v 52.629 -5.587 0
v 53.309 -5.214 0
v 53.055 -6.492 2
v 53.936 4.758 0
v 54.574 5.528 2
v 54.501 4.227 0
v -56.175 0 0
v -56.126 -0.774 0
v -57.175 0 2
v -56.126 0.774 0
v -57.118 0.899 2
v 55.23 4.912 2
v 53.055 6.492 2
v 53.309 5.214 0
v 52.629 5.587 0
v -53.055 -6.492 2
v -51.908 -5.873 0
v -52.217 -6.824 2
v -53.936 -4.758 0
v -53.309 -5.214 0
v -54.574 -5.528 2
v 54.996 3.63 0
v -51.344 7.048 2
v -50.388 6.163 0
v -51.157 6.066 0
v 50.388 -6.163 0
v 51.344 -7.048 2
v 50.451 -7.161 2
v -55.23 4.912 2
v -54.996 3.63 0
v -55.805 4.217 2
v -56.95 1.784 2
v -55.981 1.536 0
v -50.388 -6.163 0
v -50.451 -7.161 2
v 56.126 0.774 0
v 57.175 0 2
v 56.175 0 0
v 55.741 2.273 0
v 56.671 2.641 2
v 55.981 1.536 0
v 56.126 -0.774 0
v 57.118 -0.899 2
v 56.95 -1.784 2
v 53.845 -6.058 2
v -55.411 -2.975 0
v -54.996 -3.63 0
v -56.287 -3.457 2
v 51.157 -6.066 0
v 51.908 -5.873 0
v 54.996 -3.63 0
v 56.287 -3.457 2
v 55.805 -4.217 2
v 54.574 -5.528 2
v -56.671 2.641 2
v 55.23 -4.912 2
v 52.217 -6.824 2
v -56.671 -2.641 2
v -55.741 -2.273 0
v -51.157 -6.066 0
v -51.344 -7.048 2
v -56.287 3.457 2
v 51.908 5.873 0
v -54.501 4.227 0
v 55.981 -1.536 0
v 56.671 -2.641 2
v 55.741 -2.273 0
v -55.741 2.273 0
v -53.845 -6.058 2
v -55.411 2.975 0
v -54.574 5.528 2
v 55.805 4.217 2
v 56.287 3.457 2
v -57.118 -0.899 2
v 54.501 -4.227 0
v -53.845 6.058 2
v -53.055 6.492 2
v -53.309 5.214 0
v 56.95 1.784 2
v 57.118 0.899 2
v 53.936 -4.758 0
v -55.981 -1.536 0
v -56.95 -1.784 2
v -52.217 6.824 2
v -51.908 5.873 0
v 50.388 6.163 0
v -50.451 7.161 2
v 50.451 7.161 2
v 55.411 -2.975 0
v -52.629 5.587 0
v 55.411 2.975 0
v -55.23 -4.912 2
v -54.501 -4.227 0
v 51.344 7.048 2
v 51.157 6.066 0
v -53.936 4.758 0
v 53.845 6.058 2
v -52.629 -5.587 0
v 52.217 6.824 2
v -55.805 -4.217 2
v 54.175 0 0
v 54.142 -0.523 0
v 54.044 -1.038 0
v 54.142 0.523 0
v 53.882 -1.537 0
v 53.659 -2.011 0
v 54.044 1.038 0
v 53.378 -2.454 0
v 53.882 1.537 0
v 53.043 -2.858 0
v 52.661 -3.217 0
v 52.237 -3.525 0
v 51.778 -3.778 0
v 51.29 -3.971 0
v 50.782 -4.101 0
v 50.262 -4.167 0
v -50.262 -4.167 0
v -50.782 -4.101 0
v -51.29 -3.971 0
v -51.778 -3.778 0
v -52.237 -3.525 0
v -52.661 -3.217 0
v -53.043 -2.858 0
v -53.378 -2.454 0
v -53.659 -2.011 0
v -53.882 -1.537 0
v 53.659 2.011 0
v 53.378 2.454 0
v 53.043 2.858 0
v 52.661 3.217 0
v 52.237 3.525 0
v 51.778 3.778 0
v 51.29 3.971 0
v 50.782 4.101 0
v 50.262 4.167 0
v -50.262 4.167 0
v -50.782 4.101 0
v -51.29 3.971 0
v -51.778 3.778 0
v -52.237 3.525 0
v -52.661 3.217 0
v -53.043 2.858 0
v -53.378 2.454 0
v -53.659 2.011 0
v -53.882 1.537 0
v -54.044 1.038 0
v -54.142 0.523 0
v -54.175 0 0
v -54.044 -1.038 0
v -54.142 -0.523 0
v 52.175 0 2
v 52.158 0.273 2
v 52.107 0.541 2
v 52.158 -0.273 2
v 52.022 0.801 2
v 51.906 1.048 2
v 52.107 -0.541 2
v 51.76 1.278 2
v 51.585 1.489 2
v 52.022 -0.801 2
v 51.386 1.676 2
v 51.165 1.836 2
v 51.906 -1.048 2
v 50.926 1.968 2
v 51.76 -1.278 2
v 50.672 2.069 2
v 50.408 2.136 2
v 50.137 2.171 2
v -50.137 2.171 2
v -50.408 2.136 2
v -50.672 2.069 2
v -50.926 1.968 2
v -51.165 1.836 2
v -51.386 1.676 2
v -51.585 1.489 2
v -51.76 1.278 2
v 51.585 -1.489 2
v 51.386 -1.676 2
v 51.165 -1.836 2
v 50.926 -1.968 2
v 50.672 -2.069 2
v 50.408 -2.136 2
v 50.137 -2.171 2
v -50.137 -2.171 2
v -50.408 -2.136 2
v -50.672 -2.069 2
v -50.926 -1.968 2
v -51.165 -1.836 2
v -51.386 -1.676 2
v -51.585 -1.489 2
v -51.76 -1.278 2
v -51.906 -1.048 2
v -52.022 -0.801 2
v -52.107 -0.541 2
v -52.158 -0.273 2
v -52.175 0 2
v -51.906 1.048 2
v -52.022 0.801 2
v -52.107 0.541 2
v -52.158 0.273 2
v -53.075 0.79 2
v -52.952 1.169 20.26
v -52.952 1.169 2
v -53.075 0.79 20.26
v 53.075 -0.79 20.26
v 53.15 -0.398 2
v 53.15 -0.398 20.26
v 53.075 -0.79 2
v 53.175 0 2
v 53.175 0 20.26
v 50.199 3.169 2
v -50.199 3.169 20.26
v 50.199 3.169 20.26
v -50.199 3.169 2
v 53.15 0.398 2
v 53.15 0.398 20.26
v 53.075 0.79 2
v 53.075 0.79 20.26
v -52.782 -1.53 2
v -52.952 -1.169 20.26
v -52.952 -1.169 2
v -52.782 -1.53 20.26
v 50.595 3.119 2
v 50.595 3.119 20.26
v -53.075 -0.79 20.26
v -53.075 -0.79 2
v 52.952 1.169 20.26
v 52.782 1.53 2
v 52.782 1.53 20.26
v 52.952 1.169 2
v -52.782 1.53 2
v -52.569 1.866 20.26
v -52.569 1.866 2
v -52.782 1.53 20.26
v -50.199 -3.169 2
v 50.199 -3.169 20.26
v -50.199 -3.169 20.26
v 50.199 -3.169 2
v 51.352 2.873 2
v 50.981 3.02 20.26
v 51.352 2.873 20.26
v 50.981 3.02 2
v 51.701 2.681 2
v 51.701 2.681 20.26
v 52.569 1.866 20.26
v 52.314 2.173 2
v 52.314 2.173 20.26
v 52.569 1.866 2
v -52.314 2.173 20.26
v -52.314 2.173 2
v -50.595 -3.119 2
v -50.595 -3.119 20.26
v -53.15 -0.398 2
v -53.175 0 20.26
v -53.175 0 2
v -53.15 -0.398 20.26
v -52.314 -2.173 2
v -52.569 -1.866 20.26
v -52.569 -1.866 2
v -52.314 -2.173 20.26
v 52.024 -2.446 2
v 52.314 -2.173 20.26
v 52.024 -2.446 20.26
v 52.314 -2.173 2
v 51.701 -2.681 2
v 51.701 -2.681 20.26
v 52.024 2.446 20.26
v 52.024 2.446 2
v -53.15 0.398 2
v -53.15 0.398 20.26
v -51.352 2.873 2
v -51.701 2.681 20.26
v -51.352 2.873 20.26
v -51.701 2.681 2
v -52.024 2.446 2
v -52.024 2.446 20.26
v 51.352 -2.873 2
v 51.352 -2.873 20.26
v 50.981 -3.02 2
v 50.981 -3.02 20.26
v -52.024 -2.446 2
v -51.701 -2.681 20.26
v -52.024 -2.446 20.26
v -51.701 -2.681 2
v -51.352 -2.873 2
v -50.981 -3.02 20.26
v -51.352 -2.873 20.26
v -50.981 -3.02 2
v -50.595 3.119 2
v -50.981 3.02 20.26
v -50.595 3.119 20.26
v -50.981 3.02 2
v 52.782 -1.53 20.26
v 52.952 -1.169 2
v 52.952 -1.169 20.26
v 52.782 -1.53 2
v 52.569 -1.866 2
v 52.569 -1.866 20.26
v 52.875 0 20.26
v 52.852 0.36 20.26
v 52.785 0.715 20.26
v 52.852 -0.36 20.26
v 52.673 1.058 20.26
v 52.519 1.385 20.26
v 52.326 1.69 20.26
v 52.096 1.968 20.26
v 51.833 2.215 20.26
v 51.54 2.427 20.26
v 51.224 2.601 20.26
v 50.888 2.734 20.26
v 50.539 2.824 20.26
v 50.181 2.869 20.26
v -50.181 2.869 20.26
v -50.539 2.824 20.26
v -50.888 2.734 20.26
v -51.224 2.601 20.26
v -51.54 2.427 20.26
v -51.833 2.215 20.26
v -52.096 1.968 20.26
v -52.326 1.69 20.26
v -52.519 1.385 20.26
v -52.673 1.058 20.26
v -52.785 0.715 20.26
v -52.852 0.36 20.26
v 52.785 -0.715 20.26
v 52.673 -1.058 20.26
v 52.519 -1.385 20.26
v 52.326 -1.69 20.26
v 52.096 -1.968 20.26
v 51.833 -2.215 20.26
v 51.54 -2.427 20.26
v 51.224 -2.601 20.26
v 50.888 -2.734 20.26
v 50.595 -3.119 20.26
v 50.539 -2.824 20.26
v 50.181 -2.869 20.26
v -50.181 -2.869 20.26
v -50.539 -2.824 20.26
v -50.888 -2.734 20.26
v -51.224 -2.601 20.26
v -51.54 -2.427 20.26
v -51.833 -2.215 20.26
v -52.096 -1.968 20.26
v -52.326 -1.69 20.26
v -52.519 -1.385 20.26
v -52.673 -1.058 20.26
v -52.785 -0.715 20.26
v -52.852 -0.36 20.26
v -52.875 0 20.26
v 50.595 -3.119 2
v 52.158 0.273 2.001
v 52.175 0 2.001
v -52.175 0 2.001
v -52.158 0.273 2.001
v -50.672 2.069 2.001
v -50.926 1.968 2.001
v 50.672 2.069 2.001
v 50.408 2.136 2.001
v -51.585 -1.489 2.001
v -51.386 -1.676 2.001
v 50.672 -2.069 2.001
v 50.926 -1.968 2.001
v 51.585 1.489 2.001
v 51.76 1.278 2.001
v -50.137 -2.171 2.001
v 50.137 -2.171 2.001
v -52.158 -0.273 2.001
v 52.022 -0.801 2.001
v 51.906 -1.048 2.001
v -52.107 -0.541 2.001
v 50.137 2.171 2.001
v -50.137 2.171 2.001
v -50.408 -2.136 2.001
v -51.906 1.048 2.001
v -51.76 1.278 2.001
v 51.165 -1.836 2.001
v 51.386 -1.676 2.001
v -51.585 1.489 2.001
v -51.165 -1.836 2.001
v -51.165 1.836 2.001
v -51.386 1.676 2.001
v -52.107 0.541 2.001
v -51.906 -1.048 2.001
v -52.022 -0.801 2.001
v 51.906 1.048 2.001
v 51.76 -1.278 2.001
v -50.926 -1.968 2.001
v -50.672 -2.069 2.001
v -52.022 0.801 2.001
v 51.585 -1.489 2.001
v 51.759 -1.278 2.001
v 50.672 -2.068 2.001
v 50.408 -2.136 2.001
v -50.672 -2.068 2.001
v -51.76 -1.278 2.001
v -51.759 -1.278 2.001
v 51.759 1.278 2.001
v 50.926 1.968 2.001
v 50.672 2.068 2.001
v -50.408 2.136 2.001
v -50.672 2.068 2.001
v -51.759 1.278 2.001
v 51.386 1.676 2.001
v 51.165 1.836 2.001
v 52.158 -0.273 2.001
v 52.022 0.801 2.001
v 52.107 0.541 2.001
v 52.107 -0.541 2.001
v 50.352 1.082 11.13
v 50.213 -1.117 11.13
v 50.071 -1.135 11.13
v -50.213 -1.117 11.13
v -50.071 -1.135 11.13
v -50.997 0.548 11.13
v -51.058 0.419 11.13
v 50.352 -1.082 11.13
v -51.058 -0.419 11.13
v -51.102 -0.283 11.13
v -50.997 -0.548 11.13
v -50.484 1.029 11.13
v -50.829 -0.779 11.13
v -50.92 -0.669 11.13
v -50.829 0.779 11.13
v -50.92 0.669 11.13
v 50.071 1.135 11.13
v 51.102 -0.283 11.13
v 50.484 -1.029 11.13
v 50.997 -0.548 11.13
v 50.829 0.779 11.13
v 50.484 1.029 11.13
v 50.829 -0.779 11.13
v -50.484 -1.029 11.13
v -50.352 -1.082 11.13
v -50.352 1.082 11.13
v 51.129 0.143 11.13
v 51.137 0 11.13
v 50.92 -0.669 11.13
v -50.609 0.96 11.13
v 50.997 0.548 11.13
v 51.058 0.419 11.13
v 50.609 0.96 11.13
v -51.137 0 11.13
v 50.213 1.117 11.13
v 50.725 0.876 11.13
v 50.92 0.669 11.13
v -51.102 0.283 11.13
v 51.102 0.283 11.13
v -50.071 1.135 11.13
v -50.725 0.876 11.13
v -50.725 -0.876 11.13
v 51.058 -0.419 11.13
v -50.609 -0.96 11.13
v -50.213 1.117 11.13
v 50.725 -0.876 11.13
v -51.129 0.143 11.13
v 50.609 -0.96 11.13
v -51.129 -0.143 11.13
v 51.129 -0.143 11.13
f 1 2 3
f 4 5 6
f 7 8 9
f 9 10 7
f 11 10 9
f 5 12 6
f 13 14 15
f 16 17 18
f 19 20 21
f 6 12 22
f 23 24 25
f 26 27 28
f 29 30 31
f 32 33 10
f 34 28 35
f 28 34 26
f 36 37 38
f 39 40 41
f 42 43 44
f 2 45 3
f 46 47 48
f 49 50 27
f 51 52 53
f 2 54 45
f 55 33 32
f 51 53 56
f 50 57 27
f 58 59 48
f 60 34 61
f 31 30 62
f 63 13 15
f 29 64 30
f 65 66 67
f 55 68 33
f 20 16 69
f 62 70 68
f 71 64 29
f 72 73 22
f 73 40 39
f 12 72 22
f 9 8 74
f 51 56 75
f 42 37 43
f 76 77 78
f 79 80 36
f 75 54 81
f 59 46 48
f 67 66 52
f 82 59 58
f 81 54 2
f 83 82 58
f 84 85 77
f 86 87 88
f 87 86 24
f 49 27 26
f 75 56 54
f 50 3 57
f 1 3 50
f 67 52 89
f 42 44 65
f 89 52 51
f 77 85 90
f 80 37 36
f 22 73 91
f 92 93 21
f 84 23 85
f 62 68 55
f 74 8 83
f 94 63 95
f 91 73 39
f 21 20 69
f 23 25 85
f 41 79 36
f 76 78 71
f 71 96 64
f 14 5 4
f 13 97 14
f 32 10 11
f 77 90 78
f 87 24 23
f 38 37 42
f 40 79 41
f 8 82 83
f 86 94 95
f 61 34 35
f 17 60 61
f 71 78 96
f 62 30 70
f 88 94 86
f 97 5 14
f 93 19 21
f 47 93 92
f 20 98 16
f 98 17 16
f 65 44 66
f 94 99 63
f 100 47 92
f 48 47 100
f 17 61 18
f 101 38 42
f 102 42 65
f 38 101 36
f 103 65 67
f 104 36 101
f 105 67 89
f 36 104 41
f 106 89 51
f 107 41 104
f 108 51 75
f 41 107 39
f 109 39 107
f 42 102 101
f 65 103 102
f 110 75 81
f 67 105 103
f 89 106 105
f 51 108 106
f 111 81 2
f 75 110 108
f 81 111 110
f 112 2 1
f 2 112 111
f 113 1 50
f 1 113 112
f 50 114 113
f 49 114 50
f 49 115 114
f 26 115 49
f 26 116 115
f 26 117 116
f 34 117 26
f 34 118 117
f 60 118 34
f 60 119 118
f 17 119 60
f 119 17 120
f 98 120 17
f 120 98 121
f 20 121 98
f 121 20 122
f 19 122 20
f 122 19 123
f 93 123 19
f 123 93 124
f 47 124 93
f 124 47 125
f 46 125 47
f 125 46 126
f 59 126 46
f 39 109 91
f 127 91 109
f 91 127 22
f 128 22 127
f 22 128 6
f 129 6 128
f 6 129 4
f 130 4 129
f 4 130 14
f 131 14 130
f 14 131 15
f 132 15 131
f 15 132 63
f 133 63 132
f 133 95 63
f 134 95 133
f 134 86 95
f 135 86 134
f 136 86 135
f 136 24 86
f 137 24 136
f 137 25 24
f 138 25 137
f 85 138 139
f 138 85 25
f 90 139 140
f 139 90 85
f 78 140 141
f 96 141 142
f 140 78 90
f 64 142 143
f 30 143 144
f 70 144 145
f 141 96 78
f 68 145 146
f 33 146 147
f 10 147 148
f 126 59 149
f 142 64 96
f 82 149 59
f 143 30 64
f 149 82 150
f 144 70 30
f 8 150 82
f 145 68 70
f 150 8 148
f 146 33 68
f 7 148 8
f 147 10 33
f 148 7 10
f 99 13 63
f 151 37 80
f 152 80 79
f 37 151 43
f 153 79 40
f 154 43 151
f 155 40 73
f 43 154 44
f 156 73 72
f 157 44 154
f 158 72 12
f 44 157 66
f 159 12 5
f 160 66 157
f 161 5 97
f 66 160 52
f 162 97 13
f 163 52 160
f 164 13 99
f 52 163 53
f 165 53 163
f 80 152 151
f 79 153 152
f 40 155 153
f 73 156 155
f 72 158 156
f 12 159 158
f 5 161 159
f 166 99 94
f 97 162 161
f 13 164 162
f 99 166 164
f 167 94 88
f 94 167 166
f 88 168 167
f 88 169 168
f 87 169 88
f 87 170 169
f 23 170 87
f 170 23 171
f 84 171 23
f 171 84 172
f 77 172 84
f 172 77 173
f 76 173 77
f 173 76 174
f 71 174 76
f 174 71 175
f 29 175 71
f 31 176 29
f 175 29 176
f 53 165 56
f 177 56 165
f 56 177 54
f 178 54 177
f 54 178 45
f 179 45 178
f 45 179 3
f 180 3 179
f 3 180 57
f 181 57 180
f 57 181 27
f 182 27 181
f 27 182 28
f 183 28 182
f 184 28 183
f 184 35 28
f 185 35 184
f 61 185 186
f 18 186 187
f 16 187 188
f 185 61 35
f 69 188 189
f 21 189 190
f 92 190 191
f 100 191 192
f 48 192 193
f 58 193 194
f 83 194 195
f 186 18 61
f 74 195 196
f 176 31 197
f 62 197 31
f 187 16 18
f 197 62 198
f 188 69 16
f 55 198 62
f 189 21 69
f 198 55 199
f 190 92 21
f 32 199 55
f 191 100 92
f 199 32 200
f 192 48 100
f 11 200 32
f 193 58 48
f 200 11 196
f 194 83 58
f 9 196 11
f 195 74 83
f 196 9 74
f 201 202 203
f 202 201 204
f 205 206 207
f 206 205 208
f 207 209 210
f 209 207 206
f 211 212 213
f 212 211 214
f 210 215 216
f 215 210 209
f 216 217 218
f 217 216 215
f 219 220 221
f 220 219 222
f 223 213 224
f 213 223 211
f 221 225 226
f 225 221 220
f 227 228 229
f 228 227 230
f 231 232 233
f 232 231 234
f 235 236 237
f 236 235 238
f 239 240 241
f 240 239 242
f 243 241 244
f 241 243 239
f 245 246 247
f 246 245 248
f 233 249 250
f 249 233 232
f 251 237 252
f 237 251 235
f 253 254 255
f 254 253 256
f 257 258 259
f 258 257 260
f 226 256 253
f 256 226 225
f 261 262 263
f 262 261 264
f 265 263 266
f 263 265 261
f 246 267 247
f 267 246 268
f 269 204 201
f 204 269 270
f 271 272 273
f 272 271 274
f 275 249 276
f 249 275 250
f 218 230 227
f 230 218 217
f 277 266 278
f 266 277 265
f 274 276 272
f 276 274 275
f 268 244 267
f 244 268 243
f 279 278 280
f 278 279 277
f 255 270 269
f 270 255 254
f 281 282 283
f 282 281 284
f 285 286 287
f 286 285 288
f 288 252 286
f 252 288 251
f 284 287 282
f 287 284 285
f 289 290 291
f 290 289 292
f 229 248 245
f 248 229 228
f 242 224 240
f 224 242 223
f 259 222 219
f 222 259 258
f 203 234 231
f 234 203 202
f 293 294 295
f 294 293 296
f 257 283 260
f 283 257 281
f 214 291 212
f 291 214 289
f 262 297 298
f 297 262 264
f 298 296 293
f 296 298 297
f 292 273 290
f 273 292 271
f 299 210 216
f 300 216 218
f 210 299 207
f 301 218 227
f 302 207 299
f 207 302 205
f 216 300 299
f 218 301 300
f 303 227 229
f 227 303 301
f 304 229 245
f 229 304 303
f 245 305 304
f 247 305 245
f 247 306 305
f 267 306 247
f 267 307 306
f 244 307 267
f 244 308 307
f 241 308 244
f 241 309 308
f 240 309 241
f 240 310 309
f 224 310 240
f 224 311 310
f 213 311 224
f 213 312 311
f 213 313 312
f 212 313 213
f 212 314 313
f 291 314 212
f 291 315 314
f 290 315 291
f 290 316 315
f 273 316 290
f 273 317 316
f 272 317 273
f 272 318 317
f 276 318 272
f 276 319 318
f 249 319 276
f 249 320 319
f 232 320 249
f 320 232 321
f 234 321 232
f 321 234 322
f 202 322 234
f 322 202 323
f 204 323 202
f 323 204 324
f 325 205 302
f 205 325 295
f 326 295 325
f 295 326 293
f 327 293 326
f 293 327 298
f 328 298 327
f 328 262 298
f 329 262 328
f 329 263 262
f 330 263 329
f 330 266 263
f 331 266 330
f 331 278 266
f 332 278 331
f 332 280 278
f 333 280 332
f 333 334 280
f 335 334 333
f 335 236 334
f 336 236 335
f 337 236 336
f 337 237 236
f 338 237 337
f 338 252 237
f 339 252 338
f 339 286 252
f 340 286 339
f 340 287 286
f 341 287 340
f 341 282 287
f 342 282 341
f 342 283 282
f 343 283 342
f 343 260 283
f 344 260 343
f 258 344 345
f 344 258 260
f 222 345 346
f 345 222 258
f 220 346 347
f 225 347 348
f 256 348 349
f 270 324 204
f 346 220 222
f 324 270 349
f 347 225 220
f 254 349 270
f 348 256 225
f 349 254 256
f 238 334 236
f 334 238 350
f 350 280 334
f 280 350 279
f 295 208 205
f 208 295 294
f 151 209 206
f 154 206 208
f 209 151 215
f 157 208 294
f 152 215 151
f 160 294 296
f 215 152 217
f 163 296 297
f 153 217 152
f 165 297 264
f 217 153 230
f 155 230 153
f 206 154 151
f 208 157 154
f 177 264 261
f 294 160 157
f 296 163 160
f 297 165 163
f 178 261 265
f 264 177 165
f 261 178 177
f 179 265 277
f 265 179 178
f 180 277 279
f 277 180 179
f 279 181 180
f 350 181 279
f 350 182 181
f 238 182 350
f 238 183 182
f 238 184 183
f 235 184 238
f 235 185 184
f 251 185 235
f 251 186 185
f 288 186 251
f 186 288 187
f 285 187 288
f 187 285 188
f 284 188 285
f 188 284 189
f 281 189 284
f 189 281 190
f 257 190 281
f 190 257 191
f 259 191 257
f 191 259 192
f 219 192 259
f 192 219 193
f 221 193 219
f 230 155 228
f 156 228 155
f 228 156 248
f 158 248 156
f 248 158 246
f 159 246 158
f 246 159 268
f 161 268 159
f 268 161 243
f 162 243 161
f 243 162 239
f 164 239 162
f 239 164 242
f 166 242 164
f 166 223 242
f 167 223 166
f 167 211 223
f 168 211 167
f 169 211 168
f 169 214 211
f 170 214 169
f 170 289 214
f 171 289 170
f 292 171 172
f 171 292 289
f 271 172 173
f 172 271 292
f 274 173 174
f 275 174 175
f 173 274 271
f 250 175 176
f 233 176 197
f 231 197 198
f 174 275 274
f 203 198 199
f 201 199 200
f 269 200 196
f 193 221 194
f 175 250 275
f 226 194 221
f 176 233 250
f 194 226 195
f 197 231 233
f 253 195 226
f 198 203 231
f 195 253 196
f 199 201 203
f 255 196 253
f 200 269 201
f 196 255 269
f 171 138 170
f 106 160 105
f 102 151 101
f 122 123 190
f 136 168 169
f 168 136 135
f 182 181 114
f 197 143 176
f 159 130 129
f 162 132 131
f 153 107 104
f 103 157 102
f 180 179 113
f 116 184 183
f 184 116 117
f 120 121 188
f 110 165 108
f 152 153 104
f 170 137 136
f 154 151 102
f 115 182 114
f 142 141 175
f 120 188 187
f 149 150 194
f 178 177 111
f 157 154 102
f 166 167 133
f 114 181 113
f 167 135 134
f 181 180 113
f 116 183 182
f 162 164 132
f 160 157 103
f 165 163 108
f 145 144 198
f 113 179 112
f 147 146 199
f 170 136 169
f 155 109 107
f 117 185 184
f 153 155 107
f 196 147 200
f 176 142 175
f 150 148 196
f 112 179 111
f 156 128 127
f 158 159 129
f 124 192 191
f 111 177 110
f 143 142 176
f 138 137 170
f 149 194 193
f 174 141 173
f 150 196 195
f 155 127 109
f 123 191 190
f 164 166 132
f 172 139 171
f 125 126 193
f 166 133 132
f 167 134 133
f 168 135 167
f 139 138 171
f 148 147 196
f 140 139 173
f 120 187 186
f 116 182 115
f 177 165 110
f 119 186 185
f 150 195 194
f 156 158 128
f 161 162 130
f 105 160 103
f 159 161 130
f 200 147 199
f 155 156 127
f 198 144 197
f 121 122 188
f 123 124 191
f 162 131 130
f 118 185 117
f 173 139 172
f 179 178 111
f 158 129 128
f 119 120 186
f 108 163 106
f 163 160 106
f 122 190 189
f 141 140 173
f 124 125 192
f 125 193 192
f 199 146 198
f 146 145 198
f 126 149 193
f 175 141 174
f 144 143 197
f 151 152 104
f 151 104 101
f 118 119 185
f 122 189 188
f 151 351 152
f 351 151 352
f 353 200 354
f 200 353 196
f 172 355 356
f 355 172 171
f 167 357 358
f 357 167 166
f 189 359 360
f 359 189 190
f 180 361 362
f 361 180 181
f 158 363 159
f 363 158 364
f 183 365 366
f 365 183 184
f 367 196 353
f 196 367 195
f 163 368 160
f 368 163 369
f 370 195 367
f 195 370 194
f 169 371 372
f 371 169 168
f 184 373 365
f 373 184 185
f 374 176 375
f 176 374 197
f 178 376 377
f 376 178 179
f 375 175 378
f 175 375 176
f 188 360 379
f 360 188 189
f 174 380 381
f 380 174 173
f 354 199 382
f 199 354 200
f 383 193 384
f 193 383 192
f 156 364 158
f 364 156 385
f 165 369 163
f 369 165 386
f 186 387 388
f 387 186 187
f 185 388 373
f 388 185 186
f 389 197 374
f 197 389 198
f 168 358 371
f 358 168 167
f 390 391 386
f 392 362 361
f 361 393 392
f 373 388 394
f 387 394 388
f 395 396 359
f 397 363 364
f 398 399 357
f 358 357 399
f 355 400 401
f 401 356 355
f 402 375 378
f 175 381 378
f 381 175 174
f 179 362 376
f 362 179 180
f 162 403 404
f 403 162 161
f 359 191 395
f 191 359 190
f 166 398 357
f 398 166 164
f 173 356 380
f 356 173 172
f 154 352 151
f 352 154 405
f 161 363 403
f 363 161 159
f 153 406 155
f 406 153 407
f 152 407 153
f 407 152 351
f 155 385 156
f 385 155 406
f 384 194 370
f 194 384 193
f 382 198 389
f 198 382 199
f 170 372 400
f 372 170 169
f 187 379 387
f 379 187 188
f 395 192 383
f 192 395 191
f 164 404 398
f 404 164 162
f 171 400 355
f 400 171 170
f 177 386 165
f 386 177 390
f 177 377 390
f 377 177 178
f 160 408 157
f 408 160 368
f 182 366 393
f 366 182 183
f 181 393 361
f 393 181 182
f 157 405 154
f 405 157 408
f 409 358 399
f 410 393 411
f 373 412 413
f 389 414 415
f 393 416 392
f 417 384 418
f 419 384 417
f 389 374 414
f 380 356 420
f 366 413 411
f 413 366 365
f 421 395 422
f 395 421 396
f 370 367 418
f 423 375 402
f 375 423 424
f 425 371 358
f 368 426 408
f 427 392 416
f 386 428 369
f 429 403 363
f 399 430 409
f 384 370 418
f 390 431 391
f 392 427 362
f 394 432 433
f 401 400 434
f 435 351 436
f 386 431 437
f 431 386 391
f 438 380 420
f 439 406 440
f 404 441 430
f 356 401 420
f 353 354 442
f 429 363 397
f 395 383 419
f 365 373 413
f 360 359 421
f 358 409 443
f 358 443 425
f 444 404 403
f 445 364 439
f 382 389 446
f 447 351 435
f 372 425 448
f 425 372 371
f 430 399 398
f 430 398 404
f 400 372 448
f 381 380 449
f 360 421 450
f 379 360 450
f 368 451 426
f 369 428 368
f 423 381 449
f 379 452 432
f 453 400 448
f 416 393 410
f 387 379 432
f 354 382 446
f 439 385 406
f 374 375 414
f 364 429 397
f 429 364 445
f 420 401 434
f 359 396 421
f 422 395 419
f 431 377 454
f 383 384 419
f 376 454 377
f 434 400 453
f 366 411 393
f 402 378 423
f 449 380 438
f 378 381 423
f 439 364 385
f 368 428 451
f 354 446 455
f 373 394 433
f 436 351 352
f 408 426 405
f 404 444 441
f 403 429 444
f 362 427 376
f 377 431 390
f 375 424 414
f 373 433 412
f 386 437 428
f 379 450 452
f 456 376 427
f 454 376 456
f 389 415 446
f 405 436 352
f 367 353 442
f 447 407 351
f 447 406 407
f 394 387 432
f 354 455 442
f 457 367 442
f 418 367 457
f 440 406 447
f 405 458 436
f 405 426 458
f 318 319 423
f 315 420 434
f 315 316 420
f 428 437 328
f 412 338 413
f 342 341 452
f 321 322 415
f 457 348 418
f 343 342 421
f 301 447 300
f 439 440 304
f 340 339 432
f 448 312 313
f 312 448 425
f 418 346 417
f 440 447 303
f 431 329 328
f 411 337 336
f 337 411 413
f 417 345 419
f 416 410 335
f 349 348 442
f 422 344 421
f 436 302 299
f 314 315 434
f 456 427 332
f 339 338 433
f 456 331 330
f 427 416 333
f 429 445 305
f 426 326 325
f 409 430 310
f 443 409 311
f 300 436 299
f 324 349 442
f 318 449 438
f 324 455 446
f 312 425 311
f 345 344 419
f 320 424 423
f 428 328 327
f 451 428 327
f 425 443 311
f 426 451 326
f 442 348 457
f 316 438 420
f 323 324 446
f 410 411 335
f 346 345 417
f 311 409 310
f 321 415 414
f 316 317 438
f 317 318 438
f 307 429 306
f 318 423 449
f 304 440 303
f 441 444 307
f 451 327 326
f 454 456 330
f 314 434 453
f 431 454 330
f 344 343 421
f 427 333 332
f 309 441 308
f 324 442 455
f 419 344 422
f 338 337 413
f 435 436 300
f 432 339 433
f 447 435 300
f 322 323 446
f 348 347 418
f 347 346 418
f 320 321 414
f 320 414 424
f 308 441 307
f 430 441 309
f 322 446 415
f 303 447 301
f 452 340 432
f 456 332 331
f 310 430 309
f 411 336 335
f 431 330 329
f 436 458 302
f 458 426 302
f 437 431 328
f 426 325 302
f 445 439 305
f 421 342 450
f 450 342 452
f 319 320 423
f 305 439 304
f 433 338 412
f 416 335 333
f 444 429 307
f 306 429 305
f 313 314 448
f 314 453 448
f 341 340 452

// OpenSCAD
/*
 * 3D Printer Enclosure Filament Grommet
 * By smkent (GitHub) / bulbasaur0 (Printables)
 *
 * Licensed under Creative Commons (4.0 International License) Attribution
 */

/* [Rendering Options] */
// Render in print orientation (upside down)
Print_Orientation = true;

/* [Size] */
// All units in millimeters

// Thickness of surface the grommet will pass through
Height = 18.26; // [1:0.01:100]
// Horizontal width of the grommet cutout, without the rounded ends (Set to 0 for a circular grommet)
Width = 100; // [0:1500]
// Horizontal depth of the grommet cutout
Depth = 6.35; // [2:0.05:20]

Filament_Size = 1.75; // [1.75: 1.75mm, 2.85: 2.85mm]

/* [Advanced Options] */

// Height of top lip of grommet that sits above the surface
Lip_Height = 2; // [1:1:10]

// Width of the filament channel; may be less then or equal to the grommet width (Set to -1 to use Width)
Opening_Width = -1; // [-1:1:500]

// Make the filament channel this percentage wider than the filament size
Filament_Diameter_Tolerance_Percent = 30; // [0:1:100]

/* [Development Toggles] */

Preview_Full_Render = false;

module __end_customizer_options__() { }

// Constants //

$fn = ($preview && !Preview_Full_Render) ? 10 : 50;

// Modules //

module maybe_render() {
    if (Preview_Full_Render) {
        render()
        children();
    } else {
        children();
    }
}

module cutout_shape(radius, width) {
    hull()
    for(m = [0:1]) {
        mirror([m, 0])
        translate([-width/2, 0])
        circle(radius);
    }
}

module hull_stack(height, mirr=false, cut=false) {
    // Takes two children
    // Set the first child as the larger polygon
    slop = 0.001;
    translate([0, 0, mirr ? height : 0])
    mirror([0, 0, mirr ? 1 : 0])
    difference() {
        hull()
        union() {
            translate([0, 0, -slop])
            linear_extrude(height=slop)
            children(0);

            translate([0, 0, height - slop])
            linear_extrude(height=slop)
            children(1);
        }
        if (!cut) {
            translate([0, 0, -slop])
            linear_extrude(height=slop)
            children(0);
        }
    }
    if (cut) {
        translate([0, 0, -slop])
        linear_extrude(height=slop)
        children(1);
    }
}


module grommet() {
    fs = Filament_Size * (1 + Filament_Diameter_Tolerance_Percent / 100);
    ow = Opening_Width == -1 ? Width : min(Width, Opening_Width);

    difference() {
        union() {
            translate([0, 0, Height])
            hull_stack(Lip_Height, mirr=false) {
                cutout_shape(Depth / 2 + Lip_Height * 2, Width);
                cutout_shape(Depth / 2 + Lip_Height * 1.5, Width);
            }
            linear_extrude(height=Height)
            cutout_shape(Depth/2, Width);
        }
        translate([0, 0, Height])
        hull_stack(Lip_Height, mirr=true, cut=true) {
            cutout_shape((Depth / 2 + Lip_Height) - max(1, Lip_Height / 2), Width);
            cutout_shape(Depth / 2 - 1, Width);
        }
        translate([0, 0, Height / 2])
        hull_stack(Height / 2, mirr=true, cut=true) {
            cutout_shape(Depth / 2 - 1, Width);
            cutout_shape(fs / 2, ow);
        }
        hull_stack(Height / 2, cut=true) {
            cutout_shape((Depth / 2) - 0.3, Width);
            cutout_shape(fs / 2, ow);
        }
    }
}

module main() {
    color("skyblue")
    translate([0, 0, Print_Orientation ? Height + Lip_Height : 0])
    rotate([0, Print_Orientation ? 180 : 0, 0])
    maybe_render()
    grommet();
}

main();
